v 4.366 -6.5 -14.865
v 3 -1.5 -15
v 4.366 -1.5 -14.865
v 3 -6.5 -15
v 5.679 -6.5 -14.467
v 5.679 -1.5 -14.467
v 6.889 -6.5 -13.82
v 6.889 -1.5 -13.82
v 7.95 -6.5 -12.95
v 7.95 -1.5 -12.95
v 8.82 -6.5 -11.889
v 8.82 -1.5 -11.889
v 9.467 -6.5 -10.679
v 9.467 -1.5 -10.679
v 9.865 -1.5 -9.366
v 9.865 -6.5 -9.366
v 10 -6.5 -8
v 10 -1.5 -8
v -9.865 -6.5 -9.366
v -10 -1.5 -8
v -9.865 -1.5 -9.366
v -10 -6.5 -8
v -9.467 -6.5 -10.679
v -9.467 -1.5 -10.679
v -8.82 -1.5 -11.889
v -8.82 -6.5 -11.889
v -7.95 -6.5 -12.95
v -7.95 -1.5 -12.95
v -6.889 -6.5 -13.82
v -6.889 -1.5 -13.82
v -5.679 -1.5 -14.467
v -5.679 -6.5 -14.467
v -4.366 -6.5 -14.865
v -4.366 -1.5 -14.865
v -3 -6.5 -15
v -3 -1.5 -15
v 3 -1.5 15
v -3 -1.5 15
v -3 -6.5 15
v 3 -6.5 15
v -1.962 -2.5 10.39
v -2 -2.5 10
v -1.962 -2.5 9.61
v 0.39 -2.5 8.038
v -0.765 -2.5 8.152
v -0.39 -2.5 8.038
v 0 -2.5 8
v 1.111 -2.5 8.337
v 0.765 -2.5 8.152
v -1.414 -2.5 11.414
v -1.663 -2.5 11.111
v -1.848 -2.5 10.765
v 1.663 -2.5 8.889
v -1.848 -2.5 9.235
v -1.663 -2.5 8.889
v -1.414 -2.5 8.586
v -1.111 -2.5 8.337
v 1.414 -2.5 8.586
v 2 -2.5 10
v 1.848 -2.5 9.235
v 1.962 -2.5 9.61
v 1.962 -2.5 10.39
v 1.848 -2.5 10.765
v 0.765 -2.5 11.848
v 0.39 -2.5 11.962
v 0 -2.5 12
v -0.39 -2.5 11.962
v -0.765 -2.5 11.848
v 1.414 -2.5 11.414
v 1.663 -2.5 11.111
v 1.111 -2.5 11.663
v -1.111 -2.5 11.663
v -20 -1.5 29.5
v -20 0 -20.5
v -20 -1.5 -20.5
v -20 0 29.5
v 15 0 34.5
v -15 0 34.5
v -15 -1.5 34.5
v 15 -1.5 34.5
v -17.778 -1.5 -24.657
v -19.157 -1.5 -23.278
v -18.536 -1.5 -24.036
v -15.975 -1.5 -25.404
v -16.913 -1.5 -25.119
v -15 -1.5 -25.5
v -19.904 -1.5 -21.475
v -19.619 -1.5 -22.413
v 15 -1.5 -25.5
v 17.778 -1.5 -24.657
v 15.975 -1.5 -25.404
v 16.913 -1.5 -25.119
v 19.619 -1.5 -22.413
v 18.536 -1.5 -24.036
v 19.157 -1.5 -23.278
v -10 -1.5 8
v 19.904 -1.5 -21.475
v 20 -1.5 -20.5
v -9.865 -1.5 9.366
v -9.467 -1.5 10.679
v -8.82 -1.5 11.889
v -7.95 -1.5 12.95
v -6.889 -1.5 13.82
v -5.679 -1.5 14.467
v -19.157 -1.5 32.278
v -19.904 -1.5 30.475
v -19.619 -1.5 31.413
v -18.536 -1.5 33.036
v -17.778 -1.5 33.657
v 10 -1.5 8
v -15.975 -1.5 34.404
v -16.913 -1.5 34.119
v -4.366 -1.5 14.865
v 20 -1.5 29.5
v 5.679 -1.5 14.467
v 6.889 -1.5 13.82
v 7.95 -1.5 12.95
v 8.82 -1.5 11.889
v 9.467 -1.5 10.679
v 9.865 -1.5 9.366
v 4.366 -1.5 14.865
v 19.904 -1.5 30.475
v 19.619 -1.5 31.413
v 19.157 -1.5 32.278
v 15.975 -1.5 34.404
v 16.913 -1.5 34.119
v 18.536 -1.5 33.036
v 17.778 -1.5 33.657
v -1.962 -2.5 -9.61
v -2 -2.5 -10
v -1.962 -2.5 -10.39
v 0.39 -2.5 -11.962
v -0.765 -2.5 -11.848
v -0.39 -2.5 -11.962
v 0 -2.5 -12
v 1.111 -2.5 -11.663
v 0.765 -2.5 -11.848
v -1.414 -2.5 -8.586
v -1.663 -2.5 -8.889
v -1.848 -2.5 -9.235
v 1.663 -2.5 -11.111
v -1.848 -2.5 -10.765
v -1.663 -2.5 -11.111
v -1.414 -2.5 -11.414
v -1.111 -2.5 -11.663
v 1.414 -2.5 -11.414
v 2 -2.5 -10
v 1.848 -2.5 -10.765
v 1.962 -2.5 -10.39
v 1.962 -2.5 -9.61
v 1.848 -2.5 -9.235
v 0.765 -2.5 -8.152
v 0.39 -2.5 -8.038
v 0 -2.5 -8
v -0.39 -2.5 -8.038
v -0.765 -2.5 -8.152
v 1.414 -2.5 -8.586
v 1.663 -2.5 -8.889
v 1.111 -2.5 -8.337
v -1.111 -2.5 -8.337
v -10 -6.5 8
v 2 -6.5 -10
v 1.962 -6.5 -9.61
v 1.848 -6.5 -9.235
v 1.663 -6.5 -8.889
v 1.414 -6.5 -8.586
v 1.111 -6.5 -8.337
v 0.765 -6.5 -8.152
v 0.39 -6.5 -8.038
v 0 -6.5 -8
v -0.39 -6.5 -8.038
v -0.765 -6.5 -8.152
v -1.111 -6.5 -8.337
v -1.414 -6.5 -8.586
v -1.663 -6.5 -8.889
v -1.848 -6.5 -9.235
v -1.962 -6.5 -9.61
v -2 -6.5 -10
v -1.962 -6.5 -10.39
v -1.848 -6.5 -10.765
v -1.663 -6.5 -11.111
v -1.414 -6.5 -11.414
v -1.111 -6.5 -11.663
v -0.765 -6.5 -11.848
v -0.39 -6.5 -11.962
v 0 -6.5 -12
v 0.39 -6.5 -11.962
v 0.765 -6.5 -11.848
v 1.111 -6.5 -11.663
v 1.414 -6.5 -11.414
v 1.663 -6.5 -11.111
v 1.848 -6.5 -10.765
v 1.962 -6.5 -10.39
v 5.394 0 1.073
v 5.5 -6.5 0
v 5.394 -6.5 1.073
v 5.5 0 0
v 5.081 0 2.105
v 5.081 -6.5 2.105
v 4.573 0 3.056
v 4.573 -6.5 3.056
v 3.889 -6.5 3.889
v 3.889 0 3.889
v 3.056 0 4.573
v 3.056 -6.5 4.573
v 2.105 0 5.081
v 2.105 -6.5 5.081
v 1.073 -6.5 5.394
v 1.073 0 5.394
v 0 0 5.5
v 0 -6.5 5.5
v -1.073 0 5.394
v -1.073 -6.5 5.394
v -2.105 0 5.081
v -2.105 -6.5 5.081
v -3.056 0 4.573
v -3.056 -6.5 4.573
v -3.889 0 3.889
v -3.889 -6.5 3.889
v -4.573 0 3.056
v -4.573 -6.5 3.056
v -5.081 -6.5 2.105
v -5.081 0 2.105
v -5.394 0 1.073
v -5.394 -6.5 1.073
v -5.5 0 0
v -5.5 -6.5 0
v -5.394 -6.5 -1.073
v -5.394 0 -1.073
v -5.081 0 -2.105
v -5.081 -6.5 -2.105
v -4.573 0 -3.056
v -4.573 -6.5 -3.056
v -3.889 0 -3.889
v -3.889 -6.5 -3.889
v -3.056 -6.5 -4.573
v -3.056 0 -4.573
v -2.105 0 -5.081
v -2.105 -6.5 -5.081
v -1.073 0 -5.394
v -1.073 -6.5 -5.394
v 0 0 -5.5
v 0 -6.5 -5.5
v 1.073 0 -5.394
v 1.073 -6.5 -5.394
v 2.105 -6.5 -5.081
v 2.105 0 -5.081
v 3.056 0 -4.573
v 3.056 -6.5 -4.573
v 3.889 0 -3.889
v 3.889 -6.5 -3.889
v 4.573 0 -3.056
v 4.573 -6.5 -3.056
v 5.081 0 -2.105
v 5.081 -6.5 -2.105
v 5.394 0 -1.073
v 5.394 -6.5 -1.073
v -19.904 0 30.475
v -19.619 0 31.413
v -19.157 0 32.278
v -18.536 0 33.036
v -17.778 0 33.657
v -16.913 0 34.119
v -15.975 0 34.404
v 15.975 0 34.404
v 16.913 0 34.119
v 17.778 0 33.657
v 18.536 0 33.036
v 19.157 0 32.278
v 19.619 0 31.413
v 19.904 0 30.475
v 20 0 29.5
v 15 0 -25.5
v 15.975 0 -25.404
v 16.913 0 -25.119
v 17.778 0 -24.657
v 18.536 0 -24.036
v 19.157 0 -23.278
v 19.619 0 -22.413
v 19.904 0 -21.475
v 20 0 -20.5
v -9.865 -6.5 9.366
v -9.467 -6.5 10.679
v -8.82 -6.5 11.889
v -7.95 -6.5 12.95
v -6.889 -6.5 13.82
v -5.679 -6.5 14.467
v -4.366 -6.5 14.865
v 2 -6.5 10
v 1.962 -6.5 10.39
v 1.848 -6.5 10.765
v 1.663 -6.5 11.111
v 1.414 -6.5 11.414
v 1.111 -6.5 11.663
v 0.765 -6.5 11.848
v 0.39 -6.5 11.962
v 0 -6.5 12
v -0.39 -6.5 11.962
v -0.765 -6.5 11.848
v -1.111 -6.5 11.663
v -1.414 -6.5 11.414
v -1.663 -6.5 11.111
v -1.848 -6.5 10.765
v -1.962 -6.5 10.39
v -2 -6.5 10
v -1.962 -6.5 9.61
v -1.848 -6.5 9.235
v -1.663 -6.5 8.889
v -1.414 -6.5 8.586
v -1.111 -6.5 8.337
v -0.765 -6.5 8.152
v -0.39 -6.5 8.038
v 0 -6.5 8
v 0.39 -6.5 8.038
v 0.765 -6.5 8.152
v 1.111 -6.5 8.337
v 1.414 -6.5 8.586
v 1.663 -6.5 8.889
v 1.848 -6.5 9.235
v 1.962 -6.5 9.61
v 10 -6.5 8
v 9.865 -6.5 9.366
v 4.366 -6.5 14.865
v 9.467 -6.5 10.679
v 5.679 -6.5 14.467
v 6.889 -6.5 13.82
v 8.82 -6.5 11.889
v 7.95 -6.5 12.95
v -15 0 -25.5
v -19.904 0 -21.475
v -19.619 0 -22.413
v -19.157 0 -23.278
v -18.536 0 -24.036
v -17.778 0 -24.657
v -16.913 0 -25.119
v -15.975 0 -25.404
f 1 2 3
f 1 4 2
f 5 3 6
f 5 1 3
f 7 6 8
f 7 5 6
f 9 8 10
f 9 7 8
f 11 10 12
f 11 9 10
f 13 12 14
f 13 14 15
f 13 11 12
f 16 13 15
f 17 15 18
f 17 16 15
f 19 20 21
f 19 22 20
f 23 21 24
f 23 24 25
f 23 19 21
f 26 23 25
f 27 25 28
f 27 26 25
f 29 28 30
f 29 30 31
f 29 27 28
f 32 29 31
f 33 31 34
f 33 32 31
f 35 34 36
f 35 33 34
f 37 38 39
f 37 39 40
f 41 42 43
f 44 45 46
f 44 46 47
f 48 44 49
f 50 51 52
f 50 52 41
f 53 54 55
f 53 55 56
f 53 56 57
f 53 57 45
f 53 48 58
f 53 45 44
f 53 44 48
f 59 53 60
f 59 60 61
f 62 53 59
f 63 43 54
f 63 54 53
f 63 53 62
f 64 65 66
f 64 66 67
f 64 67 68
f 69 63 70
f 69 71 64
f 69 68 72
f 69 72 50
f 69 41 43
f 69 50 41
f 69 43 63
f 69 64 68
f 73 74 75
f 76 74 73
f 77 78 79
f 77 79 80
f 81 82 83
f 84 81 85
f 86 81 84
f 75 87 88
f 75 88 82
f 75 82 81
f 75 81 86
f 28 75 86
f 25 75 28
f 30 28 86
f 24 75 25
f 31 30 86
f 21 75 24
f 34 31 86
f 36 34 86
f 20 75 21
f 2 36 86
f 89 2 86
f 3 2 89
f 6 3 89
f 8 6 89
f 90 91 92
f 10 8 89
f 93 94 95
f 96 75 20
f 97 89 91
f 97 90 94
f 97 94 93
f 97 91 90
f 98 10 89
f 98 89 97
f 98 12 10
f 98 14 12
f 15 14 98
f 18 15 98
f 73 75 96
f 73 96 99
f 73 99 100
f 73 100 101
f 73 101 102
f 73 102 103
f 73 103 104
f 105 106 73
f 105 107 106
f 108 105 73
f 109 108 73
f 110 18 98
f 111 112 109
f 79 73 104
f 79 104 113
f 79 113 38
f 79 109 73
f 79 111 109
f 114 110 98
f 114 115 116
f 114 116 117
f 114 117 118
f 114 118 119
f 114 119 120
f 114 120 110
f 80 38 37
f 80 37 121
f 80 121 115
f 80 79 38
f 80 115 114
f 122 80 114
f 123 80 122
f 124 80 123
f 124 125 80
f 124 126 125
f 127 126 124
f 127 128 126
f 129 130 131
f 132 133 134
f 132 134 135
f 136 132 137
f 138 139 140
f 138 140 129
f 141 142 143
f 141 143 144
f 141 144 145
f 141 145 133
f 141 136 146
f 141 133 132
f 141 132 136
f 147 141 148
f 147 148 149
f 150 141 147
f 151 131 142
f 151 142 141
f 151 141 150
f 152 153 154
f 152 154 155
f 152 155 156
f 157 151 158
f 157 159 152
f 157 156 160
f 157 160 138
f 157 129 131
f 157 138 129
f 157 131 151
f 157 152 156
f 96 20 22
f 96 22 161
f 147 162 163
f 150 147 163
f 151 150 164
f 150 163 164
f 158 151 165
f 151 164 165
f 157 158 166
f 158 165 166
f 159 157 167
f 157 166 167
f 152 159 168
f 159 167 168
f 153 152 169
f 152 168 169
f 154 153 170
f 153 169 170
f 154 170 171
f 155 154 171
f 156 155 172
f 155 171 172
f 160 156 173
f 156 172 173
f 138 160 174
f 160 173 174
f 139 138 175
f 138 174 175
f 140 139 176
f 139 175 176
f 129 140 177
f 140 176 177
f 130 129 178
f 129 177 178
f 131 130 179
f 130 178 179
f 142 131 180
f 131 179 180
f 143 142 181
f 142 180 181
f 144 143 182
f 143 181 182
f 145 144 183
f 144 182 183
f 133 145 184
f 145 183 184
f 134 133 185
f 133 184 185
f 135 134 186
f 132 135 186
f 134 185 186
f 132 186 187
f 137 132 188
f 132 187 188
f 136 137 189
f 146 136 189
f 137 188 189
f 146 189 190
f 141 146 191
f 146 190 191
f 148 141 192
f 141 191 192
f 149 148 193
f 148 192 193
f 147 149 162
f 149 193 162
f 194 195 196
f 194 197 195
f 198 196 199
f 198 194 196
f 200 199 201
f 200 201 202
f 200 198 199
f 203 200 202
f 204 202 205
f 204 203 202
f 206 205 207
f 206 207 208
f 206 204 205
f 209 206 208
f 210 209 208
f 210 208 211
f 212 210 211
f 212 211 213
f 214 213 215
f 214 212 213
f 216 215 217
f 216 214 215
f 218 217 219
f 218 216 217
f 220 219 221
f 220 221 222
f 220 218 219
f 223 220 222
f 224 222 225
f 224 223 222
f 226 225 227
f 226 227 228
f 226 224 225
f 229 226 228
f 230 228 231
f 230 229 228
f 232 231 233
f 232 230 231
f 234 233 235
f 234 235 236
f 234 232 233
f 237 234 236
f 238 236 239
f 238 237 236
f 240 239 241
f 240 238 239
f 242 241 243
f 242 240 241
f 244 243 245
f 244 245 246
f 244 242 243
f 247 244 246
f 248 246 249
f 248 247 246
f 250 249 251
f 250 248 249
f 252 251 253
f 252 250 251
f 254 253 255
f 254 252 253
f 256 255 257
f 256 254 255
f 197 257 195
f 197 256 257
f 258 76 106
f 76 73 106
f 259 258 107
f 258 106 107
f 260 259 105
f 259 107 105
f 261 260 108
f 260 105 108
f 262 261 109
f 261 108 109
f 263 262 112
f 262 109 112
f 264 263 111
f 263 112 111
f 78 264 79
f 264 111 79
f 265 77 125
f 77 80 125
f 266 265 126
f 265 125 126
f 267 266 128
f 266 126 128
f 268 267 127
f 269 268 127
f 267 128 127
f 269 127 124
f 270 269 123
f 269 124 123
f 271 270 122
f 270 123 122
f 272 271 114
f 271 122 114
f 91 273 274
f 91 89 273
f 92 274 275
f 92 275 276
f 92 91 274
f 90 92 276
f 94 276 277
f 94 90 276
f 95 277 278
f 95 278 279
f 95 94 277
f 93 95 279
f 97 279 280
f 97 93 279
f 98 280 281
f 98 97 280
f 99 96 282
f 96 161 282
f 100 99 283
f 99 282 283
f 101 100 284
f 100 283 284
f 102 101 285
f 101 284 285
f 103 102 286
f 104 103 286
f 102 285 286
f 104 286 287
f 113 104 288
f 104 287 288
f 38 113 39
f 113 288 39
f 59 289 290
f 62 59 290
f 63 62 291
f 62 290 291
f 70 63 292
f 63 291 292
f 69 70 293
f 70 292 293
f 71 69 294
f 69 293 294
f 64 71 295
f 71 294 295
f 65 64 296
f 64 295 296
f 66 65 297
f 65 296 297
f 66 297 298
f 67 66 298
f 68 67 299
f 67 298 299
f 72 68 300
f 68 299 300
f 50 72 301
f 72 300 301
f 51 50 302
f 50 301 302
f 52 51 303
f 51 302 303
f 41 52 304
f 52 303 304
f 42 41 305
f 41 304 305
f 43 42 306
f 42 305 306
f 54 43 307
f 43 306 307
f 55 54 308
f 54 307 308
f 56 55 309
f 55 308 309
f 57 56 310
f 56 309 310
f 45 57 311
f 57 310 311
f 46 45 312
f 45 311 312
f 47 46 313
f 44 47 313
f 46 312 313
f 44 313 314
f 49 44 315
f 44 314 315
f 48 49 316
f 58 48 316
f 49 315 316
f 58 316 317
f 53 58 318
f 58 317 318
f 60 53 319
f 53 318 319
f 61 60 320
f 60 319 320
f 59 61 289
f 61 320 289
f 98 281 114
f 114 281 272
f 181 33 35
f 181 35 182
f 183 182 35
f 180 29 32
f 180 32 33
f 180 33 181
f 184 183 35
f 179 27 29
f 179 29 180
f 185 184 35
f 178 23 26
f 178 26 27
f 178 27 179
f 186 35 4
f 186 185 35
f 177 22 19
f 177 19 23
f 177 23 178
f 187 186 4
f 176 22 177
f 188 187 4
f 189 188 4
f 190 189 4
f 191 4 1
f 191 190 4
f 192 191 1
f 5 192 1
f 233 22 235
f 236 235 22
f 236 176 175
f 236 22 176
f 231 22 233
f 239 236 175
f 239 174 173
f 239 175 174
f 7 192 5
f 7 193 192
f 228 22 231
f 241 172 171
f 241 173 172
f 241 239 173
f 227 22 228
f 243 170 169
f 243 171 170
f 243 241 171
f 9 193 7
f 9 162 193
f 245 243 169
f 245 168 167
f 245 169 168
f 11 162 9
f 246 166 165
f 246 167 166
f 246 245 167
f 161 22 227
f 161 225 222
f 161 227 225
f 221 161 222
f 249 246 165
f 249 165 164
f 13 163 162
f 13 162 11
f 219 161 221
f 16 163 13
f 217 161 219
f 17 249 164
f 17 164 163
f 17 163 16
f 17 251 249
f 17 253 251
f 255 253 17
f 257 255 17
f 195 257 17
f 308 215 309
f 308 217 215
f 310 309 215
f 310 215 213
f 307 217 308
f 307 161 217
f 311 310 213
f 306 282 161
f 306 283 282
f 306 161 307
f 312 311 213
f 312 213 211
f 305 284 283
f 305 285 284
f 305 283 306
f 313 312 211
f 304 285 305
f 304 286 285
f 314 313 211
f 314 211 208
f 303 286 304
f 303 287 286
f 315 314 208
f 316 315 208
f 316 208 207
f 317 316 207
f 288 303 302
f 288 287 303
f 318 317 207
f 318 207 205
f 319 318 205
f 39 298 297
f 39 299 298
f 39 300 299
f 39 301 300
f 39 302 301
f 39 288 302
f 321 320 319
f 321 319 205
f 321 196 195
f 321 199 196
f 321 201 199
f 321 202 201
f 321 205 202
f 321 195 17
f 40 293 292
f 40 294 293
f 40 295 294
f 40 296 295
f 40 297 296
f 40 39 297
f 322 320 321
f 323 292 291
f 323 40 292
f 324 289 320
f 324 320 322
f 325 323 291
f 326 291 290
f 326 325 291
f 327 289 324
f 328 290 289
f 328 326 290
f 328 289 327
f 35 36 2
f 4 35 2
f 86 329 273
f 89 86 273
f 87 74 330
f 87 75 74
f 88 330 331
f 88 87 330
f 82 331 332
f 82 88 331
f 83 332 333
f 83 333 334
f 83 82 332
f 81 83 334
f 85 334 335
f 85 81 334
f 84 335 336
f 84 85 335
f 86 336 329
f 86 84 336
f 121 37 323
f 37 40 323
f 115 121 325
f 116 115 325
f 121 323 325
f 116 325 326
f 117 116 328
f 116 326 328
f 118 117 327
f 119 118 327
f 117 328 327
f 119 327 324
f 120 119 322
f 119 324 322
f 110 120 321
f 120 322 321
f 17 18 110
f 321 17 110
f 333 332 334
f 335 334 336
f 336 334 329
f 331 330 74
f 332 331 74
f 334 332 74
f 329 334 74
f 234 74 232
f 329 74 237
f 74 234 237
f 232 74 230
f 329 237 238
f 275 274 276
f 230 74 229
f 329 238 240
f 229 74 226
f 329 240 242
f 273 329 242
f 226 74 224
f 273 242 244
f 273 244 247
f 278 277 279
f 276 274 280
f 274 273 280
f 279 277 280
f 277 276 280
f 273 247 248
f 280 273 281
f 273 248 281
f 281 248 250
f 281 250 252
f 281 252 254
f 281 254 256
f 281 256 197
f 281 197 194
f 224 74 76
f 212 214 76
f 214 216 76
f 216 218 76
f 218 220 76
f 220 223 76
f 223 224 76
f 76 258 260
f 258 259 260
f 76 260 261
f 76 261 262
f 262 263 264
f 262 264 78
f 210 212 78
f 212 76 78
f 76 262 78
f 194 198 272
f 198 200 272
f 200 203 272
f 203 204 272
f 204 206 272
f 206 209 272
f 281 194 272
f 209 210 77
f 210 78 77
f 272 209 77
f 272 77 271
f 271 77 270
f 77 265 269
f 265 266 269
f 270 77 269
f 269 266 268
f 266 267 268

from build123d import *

# Parameters (mm, degrees)
F0_W     = 40
F0_H     = 60
F0_R     = 5.5
F1_DEPTH = 1.5
F2_W     = 20
F2_H     = 30
F2_R     = 5.5
F3_DEPTH = 5
F4_R     = 2
F5_DEPTH = 4
F6_R     = 7
F7_R     = 5


with BuildPart() as f1:
    # F0 (on Front) → F1 (new body)
    with BuildSketch(Plane.XZ):
        with Locations((0, 4.5)):
            Rectangle(F0_W, F0_H)
        Circle(F0_R, mode=Mode.SUBTRACT)
    extrude(amount=F1_DEPTH)

    # F2 (on face) → F3 (join)
    with BuildSketch(Plane.XZ.offset(1.5)):
        Rectangle(F2_W, F2_H)
        Circle(F2_R, mode=Mode.SUBTRACT)
    extrude(amount=F3_DEPTH)

    # F4 (on face) → F5 (cut)
    with BuildSketch(Plane.XZ.offset(6.5)):
        with Locations((0, 10)):
            Circle(F4_R)
        with Locations((0, -10)):
            Circle(F4_R)
    extrude(amount=-F5_DEPTH, mode=Mode.SUBTRACT)

    # F6
    f6_edges = [f1.edges().sort_by_distance(p)[0] for p in [
        (10, -4, 15),
        (-10, -4, 15),
        (10, -4, -15),
        (-10, -4, -15),
    ]]
    fillet(f6_edges, radius=F6_R)

    # F7
    f7_edges = [f1.edges().sort_by_distance(p)[0] for p in [
        (20, -0.75, 34.5),
        (20, -0.75, -25.5),
        (-20, -0.75, -25.5),
        (-20, -0.75, 34.5),
    ]]
    fillet(f7_edges, radius=F7_R)


solid = f1.part
